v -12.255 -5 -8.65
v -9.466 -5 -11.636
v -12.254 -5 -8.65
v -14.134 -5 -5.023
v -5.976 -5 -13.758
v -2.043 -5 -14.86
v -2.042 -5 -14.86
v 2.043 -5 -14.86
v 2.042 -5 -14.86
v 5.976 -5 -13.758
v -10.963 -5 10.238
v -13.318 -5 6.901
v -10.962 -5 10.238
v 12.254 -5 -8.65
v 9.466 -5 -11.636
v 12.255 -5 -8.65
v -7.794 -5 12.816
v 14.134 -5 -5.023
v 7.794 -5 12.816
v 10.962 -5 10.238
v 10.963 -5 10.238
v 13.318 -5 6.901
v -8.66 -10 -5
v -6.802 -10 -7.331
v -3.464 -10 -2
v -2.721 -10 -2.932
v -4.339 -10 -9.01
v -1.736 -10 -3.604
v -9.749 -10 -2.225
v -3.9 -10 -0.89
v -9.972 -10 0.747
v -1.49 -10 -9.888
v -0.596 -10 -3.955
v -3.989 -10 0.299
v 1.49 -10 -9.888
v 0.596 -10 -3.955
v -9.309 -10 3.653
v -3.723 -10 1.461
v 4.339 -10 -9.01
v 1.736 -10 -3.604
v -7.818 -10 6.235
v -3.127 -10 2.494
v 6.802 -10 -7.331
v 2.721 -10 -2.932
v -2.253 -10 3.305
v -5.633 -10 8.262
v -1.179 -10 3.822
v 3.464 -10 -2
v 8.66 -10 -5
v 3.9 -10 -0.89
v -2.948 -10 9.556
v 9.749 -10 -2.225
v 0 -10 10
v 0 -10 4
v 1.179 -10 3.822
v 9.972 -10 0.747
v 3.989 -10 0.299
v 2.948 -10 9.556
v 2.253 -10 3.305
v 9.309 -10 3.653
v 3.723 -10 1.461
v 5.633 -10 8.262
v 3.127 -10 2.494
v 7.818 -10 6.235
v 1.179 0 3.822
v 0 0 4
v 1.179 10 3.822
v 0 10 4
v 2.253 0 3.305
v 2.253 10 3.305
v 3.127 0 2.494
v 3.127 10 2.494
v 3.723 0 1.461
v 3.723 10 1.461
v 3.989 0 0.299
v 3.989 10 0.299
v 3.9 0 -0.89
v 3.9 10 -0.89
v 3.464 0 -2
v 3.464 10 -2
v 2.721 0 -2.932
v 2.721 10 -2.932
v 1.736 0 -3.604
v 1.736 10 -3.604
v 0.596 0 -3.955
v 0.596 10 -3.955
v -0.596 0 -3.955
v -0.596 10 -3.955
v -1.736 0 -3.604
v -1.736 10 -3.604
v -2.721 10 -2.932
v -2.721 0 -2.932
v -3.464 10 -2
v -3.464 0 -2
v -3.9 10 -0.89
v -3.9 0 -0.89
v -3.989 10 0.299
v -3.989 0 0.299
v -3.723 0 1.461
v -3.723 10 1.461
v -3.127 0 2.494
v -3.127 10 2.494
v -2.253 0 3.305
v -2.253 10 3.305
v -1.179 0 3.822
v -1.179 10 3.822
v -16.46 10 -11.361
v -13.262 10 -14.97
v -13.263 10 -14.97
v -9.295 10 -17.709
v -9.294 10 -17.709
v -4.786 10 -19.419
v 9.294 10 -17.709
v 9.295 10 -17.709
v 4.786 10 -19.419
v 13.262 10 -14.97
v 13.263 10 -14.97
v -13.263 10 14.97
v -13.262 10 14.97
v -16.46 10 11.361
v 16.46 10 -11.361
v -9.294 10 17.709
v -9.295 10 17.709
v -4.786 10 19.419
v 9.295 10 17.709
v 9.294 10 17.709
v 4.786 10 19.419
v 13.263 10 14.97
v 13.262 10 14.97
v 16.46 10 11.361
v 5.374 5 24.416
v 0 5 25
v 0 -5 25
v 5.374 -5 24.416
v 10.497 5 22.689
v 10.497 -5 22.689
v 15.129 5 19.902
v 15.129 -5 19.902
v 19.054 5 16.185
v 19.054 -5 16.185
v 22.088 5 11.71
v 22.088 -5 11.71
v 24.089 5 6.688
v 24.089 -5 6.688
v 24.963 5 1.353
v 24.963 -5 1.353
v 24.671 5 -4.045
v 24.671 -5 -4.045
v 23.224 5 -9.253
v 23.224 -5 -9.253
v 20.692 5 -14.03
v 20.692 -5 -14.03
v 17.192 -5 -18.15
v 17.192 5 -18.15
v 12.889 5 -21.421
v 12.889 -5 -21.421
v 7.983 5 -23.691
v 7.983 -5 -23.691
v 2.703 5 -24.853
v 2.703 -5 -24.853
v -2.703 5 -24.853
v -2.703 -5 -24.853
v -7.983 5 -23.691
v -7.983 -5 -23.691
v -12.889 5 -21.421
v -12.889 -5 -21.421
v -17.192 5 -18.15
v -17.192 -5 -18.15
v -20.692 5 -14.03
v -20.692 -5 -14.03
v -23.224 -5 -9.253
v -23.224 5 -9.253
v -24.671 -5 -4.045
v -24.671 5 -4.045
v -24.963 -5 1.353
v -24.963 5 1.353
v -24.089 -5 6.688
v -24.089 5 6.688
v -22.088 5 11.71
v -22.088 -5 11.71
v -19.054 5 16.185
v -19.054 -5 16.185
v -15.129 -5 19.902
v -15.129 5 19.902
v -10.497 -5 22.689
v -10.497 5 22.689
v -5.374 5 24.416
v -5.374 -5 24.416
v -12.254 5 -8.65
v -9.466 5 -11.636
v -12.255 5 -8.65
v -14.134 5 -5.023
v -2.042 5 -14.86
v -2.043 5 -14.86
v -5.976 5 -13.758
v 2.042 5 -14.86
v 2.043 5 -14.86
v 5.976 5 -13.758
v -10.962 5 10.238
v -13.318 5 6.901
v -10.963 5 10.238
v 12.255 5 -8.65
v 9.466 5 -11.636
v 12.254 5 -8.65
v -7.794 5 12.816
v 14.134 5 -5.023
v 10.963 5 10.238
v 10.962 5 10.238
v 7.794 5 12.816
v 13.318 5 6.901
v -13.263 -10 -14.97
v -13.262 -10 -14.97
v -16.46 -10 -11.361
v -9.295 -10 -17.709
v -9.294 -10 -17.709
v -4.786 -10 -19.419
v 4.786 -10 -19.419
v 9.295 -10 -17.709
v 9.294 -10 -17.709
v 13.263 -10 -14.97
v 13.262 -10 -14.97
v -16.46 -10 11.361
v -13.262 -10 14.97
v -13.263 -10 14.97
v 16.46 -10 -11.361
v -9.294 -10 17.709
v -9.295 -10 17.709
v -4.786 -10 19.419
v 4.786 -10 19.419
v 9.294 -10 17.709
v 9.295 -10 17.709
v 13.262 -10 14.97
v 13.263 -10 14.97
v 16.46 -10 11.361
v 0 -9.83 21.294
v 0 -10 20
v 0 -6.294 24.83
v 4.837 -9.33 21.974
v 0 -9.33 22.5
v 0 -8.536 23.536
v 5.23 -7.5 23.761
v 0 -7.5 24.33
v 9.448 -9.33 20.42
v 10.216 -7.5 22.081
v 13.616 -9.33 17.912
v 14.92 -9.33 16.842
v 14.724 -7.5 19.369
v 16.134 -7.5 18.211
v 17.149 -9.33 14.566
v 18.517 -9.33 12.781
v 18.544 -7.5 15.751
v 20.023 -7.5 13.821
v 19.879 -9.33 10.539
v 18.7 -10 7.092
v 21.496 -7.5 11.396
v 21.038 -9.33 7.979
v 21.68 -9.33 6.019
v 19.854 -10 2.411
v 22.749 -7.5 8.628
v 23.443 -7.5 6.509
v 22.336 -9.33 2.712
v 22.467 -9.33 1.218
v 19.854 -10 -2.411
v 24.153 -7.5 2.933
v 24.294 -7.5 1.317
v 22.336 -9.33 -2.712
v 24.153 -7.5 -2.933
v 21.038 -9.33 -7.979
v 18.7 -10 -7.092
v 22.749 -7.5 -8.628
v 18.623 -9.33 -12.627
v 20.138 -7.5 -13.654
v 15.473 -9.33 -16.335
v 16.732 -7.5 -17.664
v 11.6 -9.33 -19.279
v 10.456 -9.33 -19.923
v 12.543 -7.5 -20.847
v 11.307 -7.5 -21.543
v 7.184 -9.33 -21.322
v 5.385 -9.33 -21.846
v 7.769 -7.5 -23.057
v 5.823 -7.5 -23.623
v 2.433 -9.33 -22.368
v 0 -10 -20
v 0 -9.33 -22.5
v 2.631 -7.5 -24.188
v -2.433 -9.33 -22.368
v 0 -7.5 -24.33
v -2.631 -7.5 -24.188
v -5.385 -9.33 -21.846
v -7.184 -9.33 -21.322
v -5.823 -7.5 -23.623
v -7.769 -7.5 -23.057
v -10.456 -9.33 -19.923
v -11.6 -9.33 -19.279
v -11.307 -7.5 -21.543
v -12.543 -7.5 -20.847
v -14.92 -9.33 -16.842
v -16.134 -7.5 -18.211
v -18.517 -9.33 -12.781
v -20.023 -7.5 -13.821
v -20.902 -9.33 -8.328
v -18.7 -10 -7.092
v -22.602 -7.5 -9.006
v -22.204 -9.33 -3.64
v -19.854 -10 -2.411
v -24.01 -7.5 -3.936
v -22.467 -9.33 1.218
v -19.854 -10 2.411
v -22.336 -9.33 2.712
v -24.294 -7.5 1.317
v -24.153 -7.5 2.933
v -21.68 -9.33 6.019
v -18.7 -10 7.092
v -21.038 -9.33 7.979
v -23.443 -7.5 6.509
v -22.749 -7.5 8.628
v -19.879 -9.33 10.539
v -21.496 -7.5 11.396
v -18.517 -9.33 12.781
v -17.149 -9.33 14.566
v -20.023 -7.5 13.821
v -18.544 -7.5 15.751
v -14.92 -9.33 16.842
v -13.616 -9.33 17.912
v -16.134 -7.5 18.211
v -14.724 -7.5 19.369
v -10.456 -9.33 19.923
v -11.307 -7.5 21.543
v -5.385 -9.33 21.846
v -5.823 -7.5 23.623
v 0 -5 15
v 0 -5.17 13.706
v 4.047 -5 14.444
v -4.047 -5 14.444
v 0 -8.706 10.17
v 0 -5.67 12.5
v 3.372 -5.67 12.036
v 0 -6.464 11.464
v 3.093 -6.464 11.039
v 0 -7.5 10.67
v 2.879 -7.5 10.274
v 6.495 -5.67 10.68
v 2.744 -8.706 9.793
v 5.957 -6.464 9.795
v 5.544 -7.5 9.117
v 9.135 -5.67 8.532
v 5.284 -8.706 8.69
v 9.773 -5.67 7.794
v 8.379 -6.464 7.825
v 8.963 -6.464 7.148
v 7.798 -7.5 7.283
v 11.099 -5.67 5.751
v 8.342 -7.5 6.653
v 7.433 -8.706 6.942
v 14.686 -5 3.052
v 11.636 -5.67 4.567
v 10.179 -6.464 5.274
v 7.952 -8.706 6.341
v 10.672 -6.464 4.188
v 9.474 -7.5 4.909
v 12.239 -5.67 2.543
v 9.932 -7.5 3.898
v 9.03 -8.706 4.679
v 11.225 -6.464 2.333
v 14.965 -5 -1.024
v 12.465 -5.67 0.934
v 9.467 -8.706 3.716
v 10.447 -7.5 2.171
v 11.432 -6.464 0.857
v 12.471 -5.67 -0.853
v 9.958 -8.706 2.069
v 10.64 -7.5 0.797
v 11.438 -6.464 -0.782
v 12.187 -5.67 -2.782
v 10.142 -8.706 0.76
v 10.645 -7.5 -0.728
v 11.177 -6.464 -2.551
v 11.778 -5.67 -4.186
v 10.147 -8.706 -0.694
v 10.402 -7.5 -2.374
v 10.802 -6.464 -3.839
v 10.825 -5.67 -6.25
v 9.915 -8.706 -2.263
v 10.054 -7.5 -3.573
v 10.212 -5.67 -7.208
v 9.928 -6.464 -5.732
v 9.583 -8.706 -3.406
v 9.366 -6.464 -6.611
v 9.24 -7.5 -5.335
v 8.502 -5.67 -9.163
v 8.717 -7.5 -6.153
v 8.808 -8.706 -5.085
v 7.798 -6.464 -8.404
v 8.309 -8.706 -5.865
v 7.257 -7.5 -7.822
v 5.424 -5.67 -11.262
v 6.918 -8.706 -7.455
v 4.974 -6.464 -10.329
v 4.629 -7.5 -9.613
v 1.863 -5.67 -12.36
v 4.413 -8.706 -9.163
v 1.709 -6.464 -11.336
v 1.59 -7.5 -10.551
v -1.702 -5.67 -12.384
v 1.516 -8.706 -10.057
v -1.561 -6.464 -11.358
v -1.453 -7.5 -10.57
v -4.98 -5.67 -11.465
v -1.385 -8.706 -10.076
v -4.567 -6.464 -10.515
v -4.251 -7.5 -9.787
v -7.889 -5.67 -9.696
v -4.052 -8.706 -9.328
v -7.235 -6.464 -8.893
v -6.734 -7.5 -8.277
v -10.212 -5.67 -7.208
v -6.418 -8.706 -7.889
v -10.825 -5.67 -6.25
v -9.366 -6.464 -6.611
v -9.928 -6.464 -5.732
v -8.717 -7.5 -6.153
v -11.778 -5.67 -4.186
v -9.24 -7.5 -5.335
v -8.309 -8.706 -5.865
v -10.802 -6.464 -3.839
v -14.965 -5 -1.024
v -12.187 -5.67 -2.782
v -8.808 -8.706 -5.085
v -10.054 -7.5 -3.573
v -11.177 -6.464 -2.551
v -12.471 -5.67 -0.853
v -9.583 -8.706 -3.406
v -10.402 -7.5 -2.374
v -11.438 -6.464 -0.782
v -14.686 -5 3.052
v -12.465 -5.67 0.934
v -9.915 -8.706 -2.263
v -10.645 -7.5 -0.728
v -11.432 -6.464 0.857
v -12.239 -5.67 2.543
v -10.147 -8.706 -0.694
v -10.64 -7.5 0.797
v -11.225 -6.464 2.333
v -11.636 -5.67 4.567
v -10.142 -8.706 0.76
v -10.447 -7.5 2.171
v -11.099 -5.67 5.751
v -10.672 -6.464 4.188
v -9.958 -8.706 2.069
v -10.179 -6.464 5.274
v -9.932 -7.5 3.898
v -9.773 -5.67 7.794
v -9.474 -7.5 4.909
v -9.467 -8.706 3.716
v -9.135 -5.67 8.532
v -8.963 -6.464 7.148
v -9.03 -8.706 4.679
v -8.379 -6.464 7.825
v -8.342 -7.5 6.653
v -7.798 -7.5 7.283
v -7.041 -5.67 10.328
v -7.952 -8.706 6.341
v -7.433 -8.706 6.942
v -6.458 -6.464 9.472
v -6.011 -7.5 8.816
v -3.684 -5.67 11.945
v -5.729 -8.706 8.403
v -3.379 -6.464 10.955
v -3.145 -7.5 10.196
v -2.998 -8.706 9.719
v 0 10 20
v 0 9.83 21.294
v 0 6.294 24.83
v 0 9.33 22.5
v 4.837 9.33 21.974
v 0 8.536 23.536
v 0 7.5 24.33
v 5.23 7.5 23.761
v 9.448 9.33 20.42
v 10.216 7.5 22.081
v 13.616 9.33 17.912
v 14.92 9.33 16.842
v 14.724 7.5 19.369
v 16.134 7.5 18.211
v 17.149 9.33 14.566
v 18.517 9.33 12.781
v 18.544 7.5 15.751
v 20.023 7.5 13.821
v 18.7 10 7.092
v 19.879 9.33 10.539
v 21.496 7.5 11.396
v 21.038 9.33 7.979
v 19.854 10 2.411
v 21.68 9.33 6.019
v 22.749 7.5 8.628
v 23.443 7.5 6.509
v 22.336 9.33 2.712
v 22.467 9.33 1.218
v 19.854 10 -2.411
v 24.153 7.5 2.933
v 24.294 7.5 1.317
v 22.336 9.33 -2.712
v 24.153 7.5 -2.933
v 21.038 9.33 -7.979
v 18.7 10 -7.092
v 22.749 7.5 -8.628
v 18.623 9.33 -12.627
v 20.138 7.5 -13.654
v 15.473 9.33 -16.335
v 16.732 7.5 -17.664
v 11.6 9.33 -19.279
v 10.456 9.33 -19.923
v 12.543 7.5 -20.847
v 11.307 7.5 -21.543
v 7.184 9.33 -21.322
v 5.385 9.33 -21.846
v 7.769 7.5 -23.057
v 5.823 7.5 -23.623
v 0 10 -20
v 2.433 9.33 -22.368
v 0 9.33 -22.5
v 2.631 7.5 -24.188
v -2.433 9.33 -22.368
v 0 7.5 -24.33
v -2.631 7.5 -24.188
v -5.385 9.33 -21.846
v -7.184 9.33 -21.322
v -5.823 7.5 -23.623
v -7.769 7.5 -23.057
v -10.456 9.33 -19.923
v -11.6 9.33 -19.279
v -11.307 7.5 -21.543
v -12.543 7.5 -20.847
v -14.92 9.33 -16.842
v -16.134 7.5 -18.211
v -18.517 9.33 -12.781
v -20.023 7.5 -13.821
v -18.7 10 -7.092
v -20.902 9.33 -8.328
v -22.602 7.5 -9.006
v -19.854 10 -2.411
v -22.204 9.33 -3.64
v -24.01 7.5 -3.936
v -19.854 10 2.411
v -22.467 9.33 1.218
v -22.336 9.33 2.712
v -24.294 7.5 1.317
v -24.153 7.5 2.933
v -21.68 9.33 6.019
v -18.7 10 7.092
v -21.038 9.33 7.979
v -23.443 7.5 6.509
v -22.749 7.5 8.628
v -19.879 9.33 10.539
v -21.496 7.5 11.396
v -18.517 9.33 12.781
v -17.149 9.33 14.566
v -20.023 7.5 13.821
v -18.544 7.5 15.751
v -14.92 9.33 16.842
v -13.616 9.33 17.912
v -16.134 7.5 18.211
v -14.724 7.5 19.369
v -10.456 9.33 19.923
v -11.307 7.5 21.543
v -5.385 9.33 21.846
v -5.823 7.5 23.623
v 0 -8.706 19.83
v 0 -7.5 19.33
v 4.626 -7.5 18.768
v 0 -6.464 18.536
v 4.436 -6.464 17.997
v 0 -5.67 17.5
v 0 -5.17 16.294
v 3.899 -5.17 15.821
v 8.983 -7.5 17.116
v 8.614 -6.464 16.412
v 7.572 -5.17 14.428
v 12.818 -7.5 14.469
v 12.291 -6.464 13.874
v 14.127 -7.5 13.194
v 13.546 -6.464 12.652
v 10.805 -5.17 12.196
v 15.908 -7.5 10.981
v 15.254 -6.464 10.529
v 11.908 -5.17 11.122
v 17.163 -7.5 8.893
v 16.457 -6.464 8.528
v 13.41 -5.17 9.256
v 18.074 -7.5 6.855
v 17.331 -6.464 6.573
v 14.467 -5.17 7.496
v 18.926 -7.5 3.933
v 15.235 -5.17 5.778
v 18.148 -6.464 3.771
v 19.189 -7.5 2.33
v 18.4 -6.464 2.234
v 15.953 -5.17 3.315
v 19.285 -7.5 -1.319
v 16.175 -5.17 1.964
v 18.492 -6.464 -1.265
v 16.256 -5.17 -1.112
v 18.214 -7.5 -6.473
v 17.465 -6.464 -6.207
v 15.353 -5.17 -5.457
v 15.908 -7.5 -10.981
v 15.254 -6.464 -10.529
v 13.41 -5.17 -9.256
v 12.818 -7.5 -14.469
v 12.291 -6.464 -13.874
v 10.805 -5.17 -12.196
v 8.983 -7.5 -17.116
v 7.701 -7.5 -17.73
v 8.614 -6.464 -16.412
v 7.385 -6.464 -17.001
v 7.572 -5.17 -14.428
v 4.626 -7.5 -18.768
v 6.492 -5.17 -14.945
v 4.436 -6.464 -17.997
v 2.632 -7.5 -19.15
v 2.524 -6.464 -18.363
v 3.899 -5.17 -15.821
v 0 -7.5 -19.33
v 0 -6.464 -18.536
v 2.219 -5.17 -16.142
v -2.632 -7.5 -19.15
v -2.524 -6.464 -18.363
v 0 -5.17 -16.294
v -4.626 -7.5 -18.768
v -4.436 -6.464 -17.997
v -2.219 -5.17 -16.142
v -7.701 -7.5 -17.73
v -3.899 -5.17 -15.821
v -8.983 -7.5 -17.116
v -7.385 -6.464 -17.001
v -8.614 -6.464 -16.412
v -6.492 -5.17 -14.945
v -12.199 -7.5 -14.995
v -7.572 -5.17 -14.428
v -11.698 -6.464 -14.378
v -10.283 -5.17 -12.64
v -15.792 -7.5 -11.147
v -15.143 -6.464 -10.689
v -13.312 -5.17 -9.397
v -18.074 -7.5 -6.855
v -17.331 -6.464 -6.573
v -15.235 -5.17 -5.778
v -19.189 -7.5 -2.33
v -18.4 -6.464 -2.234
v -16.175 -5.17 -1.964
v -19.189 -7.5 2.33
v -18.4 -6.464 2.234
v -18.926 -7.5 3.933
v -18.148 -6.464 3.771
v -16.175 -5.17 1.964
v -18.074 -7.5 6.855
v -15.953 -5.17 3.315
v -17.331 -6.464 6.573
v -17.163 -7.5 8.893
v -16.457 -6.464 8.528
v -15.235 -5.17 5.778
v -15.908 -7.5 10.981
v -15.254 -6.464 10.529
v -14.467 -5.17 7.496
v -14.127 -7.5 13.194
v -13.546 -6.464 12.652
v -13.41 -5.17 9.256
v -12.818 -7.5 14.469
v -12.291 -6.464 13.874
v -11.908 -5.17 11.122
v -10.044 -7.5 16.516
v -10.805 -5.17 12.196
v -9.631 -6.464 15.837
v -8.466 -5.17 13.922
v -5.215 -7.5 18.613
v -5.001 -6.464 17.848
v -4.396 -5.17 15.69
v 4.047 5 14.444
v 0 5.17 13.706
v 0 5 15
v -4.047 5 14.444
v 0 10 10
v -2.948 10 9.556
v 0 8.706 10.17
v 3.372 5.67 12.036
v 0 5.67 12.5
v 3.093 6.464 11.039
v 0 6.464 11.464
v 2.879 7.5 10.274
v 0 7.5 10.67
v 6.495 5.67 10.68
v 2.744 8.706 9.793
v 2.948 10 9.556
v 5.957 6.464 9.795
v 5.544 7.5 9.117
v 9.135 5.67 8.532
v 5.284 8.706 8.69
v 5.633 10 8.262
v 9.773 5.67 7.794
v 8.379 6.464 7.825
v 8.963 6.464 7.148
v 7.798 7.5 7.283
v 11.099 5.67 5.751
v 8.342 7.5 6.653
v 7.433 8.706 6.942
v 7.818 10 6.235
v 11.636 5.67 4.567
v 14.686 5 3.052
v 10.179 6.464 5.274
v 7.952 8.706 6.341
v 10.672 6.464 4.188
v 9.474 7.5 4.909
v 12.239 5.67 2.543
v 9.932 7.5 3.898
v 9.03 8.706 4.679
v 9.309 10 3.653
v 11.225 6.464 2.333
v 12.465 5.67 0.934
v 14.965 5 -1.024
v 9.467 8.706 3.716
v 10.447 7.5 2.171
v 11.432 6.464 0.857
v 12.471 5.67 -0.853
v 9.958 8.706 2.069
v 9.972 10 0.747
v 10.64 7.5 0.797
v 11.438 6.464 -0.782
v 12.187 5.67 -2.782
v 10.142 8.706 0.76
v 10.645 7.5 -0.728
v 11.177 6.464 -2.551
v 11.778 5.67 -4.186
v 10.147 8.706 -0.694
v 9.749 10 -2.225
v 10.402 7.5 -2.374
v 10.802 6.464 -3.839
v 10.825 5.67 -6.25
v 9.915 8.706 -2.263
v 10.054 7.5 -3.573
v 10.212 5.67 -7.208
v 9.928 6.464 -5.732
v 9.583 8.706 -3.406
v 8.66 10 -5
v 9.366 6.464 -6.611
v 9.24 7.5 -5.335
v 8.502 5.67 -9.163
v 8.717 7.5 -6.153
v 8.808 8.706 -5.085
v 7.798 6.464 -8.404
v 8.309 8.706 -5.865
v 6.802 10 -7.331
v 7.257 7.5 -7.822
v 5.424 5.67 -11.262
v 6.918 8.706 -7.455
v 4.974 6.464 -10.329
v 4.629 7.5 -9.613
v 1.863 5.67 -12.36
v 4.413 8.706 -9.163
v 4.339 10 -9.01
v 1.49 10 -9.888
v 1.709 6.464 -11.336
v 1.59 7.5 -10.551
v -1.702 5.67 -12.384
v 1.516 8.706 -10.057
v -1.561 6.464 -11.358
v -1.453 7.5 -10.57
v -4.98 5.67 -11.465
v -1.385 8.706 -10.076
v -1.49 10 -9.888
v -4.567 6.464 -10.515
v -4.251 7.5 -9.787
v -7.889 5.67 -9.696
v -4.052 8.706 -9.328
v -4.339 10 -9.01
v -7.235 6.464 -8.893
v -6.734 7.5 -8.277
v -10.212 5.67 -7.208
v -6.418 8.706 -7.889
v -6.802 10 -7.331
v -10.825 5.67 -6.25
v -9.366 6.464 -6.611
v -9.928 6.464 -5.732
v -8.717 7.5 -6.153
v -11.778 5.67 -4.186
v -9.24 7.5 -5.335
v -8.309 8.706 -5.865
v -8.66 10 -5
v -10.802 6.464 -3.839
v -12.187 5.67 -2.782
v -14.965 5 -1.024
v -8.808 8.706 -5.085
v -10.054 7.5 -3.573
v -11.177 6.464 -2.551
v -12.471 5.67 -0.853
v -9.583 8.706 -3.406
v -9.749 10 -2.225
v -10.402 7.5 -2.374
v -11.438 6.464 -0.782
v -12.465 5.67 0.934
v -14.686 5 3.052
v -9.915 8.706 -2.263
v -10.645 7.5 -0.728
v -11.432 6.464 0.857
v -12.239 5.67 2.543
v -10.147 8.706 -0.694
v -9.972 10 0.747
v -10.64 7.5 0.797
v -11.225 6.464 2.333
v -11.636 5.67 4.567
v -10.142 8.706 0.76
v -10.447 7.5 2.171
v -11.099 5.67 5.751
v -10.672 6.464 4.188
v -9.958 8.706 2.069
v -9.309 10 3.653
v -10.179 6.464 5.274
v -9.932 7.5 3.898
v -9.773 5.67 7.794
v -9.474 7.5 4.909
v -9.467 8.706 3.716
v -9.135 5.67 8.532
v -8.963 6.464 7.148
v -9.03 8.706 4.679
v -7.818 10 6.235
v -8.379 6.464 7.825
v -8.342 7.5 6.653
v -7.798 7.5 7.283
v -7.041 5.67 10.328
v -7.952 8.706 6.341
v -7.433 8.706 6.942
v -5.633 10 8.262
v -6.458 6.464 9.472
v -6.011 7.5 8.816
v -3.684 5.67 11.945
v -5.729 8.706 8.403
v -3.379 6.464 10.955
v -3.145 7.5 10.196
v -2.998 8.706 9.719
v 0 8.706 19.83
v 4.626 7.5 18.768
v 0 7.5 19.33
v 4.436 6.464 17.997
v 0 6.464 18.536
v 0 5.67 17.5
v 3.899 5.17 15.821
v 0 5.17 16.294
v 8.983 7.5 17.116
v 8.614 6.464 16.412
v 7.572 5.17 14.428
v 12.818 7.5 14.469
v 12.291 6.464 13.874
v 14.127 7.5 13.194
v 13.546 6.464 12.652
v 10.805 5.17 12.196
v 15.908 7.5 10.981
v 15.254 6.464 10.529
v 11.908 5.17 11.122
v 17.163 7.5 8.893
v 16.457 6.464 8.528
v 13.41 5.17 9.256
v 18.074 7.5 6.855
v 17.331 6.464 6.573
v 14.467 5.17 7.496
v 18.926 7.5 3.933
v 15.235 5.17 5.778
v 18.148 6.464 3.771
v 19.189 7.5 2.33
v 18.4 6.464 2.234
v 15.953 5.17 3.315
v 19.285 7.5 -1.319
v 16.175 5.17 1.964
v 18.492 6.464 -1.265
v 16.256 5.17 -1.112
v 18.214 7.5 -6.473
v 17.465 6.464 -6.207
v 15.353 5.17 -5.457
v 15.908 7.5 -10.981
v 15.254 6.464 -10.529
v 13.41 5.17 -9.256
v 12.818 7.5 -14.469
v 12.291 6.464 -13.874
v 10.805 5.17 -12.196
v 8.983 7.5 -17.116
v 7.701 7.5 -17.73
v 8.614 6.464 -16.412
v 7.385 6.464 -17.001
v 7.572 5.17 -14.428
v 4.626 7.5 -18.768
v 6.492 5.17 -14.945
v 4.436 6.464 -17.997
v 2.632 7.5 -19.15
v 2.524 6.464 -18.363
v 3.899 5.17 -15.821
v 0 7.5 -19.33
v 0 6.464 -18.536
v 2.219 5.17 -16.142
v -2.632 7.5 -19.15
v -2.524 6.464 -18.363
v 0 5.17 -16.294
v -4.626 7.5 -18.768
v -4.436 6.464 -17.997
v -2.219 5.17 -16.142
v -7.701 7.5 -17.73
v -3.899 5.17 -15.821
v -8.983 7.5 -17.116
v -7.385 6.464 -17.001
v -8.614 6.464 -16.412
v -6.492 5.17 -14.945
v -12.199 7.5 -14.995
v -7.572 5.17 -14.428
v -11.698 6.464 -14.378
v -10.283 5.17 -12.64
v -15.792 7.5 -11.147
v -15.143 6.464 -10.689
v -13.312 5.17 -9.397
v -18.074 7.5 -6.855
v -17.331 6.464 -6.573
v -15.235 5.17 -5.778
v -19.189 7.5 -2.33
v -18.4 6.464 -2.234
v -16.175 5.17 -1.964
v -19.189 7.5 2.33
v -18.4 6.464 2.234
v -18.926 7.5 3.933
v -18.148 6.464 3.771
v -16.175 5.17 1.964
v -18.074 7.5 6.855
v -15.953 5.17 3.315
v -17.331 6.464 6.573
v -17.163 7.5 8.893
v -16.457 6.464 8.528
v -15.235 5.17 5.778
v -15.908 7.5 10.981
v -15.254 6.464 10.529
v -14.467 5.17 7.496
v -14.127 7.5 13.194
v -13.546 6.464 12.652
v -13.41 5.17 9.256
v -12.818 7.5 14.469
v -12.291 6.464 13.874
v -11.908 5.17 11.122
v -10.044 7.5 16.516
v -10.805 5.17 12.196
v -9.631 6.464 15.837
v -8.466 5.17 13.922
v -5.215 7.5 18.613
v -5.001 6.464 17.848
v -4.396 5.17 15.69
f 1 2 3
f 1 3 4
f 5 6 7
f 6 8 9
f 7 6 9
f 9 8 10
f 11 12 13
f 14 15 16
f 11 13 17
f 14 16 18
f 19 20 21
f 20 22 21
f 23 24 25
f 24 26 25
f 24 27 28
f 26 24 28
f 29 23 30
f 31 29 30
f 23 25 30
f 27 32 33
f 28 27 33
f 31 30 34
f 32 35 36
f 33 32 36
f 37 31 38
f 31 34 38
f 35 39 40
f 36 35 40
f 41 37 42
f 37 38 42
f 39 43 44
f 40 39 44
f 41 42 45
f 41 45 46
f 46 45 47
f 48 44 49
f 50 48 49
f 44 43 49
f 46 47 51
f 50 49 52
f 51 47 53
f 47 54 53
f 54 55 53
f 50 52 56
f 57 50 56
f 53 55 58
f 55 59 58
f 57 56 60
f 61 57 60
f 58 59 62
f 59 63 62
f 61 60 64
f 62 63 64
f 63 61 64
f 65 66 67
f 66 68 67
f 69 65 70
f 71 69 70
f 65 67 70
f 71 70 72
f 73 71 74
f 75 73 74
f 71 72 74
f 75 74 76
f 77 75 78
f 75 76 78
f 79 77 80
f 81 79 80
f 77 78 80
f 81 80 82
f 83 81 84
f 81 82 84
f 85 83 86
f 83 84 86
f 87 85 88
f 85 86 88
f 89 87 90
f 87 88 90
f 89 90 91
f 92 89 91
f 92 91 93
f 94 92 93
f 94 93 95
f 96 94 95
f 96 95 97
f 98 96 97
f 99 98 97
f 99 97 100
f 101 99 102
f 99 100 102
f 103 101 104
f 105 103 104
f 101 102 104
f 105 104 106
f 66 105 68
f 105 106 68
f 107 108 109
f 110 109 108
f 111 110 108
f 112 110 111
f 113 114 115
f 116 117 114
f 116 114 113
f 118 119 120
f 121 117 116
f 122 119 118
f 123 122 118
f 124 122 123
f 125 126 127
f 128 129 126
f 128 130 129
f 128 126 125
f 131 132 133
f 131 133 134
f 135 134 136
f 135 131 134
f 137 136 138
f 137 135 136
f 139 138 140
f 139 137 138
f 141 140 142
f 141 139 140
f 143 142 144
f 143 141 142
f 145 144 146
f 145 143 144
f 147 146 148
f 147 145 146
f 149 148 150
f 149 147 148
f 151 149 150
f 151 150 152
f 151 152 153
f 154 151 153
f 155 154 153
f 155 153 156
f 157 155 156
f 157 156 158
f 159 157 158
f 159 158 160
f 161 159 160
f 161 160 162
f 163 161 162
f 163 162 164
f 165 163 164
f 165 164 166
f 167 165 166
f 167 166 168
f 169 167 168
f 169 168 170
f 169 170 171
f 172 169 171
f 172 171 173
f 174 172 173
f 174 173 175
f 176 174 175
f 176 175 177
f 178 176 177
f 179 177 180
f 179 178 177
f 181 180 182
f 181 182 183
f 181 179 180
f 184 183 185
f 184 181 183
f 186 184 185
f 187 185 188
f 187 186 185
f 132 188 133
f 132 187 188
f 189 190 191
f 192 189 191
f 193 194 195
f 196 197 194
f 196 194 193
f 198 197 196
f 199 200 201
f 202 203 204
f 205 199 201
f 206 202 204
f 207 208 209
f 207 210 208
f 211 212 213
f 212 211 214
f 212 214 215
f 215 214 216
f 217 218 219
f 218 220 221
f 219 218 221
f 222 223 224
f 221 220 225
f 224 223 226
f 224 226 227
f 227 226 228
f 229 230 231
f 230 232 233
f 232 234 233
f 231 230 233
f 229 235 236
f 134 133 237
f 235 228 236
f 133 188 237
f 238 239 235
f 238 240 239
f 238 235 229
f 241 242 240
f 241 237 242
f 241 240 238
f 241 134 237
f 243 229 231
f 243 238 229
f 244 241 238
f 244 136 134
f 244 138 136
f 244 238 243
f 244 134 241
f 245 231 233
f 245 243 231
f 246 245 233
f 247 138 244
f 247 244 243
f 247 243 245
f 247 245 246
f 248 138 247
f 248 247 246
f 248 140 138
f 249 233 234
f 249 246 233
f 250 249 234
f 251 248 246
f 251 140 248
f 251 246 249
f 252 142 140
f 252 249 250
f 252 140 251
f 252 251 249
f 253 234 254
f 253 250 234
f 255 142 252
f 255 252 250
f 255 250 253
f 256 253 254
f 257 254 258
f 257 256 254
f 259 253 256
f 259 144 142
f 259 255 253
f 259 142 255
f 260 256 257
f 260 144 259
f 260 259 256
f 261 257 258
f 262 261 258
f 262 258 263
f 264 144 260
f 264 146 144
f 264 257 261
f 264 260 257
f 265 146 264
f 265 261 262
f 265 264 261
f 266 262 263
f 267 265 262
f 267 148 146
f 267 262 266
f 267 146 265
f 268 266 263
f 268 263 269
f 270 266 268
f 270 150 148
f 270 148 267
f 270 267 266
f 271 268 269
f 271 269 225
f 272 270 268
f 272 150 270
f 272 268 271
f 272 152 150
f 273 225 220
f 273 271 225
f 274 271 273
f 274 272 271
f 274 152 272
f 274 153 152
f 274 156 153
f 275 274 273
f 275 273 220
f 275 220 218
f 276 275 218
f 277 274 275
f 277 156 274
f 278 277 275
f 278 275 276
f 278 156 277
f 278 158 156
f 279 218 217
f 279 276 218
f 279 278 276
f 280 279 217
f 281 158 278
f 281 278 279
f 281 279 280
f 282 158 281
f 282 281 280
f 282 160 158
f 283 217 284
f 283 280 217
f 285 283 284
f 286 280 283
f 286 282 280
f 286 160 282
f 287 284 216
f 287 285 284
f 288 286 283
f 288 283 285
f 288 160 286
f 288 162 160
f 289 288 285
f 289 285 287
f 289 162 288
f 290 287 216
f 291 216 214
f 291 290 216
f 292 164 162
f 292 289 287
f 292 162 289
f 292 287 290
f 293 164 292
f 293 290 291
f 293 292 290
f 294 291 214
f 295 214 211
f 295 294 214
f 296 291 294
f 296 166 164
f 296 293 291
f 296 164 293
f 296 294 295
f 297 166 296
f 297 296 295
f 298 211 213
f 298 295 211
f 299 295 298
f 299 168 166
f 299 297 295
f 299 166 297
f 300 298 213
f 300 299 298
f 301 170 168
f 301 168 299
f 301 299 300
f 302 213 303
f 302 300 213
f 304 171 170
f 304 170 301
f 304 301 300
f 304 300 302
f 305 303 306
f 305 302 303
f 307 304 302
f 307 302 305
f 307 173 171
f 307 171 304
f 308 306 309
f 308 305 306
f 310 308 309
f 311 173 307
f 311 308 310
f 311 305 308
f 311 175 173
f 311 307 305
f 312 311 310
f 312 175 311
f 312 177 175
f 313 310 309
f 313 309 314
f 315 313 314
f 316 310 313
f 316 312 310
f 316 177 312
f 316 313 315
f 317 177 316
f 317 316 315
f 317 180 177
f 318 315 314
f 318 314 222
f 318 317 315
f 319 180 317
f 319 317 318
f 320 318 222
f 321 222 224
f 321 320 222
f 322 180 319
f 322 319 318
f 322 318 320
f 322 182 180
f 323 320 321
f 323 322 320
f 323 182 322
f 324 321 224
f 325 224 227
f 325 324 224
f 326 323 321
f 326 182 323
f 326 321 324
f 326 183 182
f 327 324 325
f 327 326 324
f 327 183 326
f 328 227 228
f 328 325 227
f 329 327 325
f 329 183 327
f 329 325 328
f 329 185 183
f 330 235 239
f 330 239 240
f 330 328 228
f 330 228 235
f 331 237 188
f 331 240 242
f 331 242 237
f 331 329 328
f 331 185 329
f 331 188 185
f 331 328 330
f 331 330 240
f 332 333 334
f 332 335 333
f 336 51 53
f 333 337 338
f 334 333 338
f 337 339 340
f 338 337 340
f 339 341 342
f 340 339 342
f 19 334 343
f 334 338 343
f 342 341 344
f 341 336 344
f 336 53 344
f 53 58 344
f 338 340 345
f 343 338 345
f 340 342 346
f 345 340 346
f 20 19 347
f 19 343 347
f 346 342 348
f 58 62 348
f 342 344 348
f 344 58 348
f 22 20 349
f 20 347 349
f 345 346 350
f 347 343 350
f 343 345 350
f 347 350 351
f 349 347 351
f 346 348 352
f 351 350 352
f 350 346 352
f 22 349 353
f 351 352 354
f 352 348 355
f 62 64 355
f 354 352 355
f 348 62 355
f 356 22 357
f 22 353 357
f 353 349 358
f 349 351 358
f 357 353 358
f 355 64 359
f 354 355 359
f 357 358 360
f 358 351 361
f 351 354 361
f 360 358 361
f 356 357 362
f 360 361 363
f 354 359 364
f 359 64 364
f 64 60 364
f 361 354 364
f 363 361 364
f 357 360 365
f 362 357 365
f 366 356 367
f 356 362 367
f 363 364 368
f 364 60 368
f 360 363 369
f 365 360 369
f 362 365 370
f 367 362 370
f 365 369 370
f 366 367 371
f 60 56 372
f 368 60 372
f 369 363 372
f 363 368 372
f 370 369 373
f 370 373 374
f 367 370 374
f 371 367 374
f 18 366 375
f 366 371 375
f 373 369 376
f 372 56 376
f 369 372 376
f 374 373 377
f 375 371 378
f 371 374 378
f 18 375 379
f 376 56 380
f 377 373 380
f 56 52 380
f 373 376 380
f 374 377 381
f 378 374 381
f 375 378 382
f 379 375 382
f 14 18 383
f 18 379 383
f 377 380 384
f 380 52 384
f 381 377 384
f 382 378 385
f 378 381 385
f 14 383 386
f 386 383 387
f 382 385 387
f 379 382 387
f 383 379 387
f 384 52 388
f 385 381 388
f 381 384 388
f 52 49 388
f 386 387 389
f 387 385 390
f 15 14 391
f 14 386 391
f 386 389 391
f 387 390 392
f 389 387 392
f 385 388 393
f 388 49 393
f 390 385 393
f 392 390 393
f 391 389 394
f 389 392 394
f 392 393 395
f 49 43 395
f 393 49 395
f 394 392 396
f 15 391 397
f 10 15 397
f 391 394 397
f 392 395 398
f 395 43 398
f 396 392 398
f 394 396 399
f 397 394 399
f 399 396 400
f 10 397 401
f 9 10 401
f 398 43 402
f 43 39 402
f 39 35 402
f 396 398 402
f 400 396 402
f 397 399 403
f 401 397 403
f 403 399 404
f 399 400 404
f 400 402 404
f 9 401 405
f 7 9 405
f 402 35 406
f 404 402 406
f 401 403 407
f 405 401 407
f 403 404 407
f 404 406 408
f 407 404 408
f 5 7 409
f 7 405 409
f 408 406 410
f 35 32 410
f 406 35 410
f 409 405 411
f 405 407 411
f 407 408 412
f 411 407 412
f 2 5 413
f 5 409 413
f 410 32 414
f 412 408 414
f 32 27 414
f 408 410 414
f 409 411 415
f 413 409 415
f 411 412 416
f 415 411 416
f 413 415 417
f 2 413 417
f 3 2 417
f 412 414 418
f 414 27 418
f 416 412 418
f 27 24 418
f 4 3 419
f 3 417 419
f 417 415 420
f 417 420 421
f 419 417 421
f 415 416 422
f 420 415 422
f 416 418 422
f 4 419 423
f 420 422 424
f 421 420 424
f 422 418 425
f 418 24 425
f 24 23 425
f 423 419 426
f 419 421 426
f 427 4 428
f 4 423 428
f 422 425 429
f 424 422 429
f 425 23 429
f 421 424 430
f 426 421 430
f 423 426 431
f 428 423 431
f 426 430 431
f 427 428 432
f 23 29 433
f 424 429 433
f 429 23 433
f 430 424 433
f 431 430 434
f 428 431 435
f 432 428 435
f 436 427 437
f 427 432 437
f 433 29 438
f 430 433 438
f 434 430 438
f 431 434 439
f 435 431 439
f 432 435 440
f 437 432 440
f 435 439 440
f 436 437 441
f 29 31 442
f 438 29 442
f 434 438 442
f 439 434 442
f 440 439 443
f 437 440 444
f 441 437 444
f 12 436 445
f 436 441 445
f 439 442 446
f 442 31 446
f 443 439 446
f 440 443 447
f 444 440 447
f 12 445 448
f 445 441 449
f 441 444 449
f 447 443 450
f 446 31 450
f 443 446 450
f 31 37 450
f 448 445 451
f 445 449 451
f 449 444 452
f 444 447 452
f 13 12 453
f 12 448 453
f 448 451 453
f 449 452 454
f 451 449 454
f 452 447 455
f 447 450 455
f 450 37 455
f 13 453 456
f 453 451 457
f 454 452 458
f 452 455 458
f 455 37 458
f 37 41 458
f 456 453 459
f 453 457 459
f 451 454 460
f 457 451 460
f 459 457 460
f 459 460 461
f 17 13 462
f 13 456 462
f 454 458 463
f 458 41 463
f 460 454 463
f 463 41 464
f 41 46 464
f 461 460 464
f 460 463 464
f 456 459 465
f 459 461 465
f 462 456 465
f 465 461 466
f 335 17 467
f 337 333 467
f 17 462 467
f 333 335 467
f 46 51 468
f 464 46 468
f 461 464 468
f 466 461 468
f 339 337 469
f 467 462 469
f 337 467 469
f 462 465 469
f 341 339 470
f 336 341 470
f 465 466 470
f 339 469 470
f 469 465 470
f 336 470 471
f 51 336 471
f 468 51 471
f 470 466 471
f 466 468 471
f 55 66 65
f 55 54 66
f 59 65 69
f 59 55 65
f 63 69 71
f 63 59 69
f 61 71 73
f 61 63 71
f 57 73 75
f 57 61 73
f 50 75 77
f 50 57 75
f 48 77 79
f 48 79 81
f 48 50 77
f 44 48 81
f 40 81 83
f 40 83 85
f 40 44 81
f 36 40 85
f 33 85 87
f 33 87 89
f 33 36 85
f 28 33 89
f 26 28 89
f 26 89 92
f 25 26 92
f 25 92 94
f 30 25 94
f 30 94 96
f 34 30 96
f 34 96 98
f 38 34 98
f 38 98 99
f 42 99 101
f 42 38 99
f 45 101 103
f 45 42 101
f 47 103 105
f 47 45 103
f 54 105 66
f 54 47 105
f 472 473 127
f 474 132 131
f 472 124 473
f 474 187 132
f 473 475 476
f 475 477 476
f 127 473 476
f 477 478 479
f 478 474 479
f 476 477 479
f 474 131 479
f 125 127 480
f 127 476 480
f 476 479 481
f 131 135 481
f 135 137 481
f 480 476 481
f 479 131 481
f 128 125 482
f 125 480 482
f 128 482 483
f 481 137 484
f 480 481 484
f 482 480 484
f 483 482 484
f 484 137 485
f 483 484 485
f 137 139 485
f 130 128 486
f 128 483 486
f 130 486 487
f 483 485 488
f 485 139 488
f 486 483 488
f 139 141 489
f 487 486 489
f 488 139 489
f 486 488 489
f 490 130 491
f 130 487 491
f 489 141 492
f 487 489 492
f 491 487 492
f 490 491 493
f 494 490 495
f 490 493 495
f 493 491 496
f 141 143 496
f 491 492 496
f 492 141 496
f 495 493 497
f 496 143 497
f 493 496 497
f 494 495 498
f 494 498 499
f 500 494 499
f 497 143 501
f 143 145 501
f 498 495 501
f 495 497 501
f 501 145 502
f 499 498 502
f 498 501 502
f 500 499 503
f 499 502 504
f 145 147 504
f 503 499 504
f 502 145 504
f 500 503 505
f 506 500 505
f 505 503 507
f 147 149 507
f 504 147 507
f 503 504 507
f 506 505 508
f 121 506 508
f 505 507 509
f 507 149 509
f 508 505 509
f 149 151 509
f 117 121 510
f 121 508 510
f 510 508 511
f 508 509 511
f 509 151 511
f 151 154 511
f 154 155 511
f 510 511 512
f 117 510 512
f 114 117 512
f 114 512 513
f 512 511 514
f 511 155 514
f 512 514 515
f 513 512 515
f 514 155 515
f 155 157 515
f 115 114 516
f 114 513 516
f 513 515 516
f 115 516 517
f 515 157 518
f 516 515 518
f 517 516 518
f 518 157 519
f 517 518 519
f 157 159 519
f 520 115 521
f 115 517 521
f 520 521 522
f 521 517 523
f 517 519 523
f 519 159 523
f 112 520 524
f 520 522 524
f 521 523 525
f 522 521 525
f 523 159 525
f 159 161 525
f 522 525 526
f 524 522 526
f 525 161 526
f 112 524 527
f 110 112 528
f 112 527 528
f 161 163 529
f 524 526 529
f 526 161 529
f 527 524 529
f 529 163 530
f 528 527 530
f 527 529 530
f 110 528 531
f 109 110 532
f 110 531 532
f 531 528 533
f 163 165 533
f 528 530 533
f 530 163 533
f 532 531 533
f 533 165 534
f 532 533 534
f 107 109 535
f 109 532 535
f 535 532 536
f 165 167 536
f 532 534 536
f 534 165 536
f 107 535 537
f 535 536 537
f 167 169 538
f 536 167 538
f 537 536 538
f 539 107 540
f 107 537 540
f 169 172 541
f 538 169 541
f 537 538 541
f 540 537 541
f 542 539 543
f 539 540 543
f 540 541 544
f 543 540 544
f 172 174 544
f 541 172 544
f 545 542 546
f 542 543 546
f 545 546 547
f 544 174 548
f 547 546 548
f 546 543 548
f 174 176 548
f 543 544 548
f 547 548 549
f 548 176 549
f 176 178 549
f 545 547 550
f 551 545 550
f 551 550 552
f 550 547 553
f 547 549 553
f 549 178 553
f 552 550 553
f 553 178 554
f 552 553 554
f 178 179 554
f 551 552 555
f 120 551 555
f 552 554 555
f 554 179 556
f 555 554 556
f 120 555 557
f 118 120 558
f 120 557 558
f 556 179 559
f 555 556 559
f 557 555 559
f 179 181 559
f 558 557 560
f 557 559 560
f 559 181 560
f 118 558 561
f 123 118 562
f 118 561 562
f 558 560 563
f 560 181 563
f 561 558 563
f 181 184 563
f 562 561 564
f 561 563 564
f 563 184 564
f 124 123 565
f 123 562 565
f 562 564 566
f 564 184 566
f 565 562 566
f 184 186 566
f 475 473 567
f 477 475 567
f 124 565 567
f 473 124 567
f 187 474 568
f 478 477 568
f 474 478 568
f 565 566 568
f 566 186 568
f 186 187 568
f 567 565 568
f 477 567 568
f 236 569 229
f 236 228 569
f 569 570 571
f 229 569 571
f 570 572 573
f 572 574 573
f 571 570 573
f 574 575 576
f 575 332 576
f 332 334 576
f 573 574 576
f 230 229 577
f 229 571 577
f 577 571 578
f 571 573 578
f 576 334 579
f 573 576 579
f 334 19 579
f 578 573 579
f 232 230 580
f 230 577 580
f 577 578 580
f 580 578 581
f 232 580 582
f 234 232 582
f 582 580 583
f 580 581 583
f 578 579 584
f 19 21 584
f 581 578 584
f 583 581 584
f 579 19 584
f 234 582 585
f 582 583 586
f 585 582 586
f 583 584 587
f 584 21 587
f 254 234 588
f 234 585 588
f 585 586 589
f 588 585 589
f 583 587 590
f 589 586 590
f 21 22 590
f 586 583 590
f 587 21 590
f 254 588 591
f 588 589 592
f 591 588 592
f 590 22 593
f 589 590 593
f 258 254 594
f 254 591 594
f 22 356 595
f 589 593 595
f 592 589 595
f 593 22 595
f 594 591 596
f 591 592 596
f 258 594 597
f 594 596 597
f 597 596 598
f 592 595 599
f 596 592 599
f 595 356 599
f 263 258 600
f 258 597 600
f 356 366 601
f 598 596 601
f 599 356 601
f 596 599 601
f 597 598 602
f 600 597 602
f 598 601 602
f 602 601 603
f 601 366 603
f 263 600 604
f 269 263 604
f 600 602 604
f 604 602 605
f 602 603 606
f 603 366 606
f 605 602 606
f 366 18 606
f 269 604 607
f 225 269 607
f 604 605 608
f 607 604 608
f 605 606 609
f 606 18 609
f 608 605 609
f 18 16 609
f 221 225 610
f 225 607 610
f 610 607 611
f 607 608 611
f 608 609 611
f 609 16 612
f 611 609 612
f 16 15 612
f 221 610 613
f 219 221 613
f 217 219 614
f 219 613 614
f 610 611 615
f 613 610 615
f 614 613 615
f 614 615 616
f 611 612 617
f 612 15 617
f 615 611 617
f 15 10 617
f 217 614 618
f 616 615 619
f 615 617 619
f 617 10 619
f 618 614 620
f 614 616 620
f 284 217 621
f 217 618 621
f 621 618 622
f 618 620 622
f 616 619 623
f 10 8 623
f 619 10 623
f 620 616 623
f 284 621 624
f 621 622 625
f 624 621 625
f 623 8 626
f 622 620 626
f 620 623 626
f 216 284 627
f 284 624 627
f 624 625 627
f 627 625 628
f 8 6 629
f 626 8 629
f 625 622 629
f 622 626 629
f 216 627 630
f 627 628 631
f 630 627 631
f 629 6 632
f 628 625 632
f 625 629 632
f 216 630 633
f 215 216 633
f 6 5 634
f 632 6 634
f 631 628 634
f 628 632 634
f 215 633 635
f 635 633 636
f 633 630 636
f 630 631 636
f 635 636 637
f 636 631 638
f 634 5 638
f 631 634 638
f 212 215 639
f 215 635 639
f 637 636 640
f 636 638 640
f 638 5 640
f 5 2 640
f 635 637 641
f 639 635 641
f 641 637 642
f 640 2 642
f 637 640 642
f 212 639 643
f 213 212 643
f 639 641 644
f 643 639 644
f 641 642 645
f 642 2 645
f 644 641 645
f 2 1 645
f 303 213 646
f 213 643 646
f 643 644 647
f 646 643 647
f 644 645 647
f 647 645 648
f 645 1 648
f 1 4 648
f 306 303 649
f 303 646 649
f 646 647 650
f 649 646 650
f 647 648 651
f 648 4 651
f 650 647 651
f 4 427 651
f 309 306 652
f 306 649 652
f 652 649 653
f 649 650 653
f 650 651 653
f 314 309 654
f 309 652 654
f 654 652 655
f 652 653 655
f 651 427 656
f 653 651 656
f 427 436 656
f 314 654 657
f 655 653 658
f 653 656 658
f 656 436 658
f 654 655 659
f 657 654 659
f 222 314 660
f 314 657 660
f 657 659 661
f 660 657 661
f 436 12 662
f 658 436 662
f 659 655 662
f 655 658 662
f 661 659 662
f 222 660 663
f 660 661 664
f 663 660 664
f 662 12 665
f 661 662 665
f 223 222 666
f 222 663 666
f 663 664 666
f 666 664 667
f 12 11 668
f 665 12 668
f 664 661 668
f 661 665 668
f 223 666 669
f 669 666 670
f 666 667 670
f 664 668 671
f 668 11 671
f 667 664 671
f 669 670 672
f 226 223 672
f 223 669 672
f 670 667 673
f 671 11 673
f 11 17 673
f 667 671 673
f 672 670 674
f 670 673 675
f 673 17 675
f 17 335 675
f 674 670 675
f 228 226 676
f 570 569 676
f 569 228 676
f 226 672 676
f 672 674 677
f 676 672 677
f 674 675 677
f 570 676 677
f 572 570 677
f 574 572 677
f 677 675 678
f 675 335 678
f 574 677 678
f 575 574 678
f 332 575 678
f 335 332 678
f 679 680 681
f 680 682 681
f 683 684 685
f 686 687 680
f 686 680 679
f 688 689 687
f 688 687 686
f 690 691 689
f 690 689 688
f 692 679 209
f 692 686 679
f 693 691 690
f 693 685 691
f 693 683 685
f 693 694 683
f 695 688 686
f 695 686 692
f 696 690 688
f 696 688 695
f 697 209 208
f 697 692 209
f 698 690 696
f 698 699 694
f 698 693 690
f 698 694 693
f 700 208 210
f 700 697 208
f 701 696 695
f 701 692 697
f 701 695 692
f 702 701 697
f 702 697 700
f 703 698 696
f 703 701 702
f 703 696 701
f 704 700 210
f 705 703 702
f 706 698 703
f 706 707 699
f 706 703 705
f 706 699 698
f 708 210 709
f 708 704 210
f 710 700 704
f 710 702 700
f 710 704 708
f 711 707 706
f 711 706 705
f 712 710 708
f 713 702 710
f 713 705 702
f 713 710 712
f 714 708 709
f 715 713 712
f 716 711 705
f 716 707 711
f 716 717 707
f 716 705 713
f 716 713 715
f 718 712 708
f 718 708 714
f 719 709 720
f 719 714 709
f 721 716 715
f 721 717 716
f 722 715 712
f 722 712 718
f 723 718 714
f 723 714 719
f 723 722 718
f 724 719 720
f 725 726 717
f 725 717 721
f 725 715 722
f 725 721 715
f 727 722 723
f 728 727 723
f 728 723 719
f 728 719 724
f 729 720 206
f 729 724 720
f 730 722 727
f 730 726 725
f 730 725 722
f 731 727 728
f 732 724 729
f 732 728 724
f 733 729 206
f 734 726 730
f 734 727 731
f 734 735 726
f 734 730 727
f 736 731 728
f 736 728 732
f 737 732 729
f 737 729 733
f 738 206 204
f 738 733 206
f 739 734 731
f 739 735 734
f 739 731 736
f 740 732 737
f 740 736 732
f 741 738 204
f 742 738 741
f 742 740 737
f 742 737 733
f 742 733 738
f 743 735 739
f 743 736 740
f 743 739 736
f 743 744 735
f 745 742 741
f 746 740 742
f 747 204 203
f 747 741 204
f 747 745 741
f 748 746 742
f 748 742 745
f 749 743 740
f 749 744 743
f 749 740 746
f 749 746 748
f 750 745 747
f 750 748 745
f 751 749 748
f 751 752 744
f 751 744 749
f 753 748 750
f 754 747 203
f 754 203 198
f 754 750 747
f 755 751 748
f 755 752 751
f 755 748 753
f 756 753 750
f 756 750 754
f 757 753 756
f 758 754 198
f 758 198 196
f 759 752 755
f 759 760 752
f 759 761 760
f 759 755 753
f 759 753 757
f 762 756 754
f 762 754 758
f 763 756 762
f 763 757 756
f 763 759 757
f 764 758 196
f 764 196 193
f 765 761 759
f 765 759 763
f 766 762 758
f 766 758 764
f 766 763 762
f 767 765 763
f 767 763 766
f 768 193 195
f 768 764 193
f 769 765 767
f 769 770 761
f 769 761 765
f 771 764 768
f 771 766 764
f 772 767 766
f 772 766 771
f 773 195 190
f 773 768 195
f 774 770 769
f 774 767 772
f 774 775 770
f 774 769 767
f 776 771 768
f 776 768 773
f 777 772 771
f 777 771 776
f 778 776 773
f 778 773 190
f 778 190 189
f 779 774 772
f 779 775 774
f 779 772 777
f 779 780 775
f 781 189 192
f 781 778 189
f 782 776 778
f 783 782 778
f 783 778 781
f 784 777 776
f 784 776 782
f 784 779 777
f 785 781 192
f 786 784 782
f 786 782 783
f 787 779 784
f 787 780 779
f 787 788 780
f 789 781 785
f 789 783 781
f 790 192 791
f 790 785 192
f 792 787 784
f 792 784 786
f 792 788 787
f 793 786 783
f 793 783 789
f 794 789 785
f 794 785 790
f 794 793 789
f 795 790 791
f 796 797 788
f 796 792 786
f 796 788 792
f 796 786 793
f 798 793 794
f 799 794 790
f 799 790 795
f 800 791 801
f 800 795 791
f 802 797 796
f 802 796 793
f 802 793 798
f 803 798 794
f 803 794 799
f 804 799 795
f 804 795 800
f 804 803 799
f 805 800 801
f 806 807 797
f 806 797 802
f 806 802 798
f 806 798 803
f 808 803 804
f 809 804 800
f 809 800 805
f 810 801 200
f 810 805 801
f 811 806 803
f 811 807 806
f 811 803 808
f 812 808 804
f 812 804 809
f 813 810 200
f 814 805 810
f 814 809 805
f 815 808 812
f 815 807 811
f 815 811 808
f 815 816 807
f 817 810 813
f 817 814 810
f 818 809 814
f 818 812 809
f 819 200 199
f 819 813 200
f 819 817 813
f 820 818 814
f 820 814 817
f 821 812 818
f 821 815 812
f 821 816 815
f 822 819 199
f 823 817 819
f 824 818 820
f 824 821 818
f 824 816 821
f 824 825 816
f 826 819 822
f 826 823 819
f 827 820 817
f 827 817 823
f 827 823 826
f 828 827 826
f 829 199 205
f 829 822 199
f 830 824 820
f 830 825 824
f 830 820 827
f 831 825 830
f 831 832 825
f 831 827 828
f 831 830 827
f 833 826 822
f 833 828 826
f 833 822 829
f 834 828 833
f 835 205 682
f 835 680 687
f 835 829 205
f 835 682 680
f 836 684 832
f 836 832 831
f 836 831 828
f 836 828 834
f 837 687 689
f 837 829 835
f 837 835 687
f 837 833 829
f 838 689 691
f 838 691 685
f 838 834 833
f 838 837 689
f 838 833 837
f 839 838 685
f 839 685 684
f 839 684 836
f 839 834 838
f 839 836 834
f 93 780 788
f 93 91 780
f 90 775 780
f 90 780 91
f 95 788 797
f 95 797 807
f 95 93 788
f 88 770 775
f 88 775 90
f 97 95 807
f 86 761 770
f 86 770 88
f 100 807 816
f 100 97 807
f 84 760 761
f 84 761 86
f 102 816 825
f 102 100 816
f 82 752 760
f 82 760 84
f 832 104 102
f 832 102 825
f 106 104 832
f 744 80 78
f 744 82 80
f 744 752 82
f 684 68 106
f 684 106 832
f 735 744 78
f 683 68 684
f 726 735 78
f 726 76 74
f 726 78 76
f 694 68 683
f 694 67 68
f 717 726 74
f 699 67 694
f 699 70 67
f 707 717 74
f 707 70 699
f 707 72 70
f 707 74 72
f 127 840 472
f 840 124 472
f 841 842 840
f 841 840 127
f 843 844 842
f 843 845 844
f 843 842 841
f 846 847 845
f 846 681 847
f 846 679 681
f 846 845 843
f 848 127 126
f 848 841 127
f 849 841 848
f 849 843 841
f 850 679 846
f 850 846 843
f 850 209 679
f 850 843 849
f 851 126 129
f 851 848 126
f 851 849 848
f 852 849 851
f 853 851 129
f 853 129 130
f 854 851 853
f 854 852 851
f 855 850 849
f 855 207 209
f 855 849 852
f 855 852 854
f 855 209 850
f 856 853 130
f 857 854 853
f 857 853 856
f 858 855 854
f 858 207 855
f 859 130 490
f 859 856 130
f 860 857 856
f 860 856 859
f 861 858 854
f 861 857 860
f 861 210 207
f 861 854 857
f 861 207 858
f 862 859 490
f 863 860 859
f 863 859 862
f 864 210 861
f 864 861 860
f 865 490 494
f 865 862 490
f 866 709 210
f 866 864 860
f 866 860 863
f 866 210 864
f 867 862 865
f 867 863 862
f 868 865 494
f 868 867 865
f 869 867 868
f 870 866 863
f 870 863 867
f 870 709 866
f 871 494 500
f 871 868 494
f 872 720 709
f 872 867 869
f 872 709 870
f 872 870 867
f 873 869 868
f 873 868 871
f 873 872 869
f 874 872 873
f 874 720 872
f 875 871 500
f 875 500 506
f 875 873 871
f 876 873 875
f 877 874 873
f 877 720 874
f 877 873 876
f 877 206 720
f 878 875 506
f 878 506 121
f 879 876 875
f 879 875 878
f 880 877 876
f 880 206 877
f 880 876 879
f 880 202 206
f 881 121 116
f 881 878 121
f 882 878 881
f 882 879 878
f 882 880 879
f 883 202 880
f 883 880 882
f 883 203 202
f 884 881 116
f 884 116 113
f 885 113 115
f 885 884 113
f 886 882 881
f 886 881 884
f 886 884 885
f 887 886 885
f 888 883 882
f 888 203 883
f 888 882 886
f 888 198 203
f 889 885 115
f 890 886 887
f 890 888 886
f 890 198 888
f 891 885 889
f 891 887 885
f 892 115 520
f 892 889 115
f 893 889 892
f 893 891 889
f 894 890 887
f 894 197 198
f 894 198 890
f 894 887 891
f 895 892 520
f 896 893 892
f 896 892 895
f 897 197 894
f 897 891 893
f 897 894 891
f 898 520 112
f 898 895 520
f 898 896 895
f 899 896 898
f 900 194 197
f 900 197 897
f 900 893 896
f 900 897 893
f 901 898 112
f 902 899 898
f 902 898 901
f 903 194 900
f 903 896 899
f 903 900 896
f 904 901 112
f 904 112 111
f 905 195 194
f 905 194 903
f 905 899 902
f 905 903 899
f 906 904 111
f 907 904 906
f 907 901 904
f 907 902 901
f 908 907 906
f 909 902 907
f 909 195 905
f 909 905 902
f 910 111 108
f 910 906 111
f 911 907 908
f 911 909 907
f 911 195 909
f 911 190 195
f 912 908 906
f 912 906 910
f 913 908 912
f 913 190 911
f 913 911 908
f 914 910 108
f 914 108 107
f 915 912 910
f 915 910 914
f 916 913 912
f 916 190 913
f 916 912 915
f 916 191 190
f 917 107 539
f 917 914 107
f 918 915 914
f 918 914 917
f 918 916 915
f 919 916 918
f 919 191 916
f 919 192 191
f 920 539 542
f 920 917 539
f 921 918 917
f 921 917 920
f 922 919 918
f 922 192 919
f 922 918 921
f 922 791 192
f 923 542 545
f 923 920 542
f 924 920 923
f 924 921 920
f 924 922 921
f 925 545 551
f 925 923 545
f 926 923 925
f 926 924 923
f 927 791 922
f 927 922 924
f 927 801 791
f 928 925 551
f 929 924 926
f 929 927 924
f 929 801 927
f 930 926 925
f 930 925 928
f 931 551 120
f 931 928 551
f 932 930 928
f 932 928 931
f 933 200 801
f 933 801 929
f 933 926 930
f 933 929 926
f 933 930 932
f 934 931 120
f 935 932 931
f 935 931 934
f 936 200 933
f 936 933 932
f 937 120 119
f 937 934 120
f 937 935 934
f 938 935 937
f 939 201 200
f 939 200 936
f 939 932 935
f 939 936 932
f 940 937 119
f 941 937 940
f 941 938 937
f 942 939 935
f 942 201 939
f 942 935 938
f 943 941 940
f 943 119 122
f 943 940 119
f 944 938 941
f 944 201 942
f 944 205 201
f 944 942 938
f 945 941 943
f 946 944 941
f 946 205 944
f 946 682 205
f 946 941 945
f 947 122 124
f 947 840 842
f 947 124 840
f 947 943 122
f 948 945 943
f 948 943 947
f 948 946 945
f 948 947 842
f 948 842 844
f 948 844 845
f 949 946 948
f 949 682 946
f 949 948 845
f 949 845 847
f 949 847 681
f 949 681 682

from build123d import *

# Parameters (mm, degrees)
SZKIC1_R                    = 25
DODANIE_WYCI_GNI_CIE1_DEPTH = 10
SZKIC2_R                    = 20
SZKIC2_R_2                  = 10
WYTNIJ_WYCI_GNI_CIE1_DEPTH  = 5
ZAOKR_GLENIE1_R             = 5
SZKIC3_R                    = 4
WYTNIJ_WYCI_GNI_CIE2_DEPTH  = 37.742346142
ZAOKR_GLENIE2_R             = 5
ZAOKR_GLENIE1_OF_LUSTRO1_R  = 5
ZAOKR_GLENIE2_OF_LUSTRO1_R  = 5


with BuildPart() as part:
    # Szkic1 → Dodanie-wyciągnięcie1 (new body)
    with BuildSketch(Plane(origin=(0, 0, 0), x_dir=(1, 0, 0), z_dir=(0, 1, 0))):
        with Locations(Location((0, 0, 0), (0, 0, 270))):
            Circle(SZKIC1_R)
    dodanie_wyci_gni_cie1 = extrude(amount=DODANIE_WYCI_GNI_CIE1_DEPTH)

    # Szkic2 → Wytnij-wyciągnięcie1 (cut)
    with BuildSketch(Plane(origin=(0, 10, 0), x_dir=(1, 0, 0), z_dir=(0, 1, 0))):
        with Locations(Location((0, 0, 0), (0, 0, 270))):
            Circle(SZKIC2_R)
        with Locations(Location((0, 0, 0), (0, 0, 270))):
            Circle(SZKIC2_R_2, mode=Mode.SUBTRACT)
    wytnij_wyci_gni_cie1 = extrude(amount=-WYTNIJ_WYCI_GNI_CIE1_DEPTH, mode=Mode.SUBTRACT)

    # Zaokrąglenie1
    zaokr_glenie1_edges = [part.edges().sort_by_distance(p)[0] for p in [
        (0, 5, -20),
        (0, 5, -10),
    ]]
    fillet(zaokr_glenie1_edges, radius=ZAOKR_GLENIE1_R - 0.0001)  # a hair under: the kernel refuses the full size

    # Szkic3 → Wytnij-wyciągnięcie2 (cut, symmetric)
    with BuildSketch(Plane(origin=(0, 10, 0), x_dir=(1, 0, 0), z_dir=(0, 1, 0))):
        with Locations(Location((0, 0, 0), (0, 0, 270))):
            Circle(SZKIC3_R)
    wytnij_wyci_gni_cie2 = extrude(amount=WYTNIJ_WYCI_GNI_CIE2_DEPTH, both=True, mode=Mode.SUBTRACT)

    # Zaokrąglenie2
    zaokr_glenie2_edges = [part.edges().sort_by_distance(p)[0] for p in [
        (0, 10, -25),
    ]]
    fillet(zaokr_glenie2_edges, radius=ZAOKR_GLENIE2_R - 0.0001)  # a hair under: the kernel refuses the full size

    # Lustro1: Dodanie-wyciągnięcie1, Wytnij-wyciągnięcie1, Wytnij-wyciągnięcie2 across plane
    add(dodanie_wyci_gni_cie1.mirror(Plane.ZX))
    add(wytnij_wyci_gni_cie1.mirror(Plane.ZX), mode=Mode.SUBTRACT)
    add(wytnij_wyci_gni_cie2.mirror(Plane.ZX), mode=Mode.SUBTRACT)

    # Zaokrąglenie1 of Lustro1
    zaokr_glenie1_of_lustro1_edges = [part.edges().sort_by_distance(p)[0] for p in [
        (0, -5, -20),
        (0, -5, -10),
    ]]
    fillet(zaokr_glenie1_of_lustro1_edges, radius=ZAOKR_GLENIE1_OF_LUSTRO1_R - 0.0001)  # a hair under: the kernel refuses the full size

    # Zaokrąglenie2 of Lustro1
    zaokr_glenie2_of_lustro1_edges = [part.edges().sort_by_distance(p)[0] for p in [
        (0, -10, -25),
    ]]
    fillet(zaokr_glenie2_of_lustro1_edges, radius=ZAOKR_GLENIE2_OF_LUSTRO1_R - 0.0001)  # a hair under: the kernel refuses the full size


solid = part.part
